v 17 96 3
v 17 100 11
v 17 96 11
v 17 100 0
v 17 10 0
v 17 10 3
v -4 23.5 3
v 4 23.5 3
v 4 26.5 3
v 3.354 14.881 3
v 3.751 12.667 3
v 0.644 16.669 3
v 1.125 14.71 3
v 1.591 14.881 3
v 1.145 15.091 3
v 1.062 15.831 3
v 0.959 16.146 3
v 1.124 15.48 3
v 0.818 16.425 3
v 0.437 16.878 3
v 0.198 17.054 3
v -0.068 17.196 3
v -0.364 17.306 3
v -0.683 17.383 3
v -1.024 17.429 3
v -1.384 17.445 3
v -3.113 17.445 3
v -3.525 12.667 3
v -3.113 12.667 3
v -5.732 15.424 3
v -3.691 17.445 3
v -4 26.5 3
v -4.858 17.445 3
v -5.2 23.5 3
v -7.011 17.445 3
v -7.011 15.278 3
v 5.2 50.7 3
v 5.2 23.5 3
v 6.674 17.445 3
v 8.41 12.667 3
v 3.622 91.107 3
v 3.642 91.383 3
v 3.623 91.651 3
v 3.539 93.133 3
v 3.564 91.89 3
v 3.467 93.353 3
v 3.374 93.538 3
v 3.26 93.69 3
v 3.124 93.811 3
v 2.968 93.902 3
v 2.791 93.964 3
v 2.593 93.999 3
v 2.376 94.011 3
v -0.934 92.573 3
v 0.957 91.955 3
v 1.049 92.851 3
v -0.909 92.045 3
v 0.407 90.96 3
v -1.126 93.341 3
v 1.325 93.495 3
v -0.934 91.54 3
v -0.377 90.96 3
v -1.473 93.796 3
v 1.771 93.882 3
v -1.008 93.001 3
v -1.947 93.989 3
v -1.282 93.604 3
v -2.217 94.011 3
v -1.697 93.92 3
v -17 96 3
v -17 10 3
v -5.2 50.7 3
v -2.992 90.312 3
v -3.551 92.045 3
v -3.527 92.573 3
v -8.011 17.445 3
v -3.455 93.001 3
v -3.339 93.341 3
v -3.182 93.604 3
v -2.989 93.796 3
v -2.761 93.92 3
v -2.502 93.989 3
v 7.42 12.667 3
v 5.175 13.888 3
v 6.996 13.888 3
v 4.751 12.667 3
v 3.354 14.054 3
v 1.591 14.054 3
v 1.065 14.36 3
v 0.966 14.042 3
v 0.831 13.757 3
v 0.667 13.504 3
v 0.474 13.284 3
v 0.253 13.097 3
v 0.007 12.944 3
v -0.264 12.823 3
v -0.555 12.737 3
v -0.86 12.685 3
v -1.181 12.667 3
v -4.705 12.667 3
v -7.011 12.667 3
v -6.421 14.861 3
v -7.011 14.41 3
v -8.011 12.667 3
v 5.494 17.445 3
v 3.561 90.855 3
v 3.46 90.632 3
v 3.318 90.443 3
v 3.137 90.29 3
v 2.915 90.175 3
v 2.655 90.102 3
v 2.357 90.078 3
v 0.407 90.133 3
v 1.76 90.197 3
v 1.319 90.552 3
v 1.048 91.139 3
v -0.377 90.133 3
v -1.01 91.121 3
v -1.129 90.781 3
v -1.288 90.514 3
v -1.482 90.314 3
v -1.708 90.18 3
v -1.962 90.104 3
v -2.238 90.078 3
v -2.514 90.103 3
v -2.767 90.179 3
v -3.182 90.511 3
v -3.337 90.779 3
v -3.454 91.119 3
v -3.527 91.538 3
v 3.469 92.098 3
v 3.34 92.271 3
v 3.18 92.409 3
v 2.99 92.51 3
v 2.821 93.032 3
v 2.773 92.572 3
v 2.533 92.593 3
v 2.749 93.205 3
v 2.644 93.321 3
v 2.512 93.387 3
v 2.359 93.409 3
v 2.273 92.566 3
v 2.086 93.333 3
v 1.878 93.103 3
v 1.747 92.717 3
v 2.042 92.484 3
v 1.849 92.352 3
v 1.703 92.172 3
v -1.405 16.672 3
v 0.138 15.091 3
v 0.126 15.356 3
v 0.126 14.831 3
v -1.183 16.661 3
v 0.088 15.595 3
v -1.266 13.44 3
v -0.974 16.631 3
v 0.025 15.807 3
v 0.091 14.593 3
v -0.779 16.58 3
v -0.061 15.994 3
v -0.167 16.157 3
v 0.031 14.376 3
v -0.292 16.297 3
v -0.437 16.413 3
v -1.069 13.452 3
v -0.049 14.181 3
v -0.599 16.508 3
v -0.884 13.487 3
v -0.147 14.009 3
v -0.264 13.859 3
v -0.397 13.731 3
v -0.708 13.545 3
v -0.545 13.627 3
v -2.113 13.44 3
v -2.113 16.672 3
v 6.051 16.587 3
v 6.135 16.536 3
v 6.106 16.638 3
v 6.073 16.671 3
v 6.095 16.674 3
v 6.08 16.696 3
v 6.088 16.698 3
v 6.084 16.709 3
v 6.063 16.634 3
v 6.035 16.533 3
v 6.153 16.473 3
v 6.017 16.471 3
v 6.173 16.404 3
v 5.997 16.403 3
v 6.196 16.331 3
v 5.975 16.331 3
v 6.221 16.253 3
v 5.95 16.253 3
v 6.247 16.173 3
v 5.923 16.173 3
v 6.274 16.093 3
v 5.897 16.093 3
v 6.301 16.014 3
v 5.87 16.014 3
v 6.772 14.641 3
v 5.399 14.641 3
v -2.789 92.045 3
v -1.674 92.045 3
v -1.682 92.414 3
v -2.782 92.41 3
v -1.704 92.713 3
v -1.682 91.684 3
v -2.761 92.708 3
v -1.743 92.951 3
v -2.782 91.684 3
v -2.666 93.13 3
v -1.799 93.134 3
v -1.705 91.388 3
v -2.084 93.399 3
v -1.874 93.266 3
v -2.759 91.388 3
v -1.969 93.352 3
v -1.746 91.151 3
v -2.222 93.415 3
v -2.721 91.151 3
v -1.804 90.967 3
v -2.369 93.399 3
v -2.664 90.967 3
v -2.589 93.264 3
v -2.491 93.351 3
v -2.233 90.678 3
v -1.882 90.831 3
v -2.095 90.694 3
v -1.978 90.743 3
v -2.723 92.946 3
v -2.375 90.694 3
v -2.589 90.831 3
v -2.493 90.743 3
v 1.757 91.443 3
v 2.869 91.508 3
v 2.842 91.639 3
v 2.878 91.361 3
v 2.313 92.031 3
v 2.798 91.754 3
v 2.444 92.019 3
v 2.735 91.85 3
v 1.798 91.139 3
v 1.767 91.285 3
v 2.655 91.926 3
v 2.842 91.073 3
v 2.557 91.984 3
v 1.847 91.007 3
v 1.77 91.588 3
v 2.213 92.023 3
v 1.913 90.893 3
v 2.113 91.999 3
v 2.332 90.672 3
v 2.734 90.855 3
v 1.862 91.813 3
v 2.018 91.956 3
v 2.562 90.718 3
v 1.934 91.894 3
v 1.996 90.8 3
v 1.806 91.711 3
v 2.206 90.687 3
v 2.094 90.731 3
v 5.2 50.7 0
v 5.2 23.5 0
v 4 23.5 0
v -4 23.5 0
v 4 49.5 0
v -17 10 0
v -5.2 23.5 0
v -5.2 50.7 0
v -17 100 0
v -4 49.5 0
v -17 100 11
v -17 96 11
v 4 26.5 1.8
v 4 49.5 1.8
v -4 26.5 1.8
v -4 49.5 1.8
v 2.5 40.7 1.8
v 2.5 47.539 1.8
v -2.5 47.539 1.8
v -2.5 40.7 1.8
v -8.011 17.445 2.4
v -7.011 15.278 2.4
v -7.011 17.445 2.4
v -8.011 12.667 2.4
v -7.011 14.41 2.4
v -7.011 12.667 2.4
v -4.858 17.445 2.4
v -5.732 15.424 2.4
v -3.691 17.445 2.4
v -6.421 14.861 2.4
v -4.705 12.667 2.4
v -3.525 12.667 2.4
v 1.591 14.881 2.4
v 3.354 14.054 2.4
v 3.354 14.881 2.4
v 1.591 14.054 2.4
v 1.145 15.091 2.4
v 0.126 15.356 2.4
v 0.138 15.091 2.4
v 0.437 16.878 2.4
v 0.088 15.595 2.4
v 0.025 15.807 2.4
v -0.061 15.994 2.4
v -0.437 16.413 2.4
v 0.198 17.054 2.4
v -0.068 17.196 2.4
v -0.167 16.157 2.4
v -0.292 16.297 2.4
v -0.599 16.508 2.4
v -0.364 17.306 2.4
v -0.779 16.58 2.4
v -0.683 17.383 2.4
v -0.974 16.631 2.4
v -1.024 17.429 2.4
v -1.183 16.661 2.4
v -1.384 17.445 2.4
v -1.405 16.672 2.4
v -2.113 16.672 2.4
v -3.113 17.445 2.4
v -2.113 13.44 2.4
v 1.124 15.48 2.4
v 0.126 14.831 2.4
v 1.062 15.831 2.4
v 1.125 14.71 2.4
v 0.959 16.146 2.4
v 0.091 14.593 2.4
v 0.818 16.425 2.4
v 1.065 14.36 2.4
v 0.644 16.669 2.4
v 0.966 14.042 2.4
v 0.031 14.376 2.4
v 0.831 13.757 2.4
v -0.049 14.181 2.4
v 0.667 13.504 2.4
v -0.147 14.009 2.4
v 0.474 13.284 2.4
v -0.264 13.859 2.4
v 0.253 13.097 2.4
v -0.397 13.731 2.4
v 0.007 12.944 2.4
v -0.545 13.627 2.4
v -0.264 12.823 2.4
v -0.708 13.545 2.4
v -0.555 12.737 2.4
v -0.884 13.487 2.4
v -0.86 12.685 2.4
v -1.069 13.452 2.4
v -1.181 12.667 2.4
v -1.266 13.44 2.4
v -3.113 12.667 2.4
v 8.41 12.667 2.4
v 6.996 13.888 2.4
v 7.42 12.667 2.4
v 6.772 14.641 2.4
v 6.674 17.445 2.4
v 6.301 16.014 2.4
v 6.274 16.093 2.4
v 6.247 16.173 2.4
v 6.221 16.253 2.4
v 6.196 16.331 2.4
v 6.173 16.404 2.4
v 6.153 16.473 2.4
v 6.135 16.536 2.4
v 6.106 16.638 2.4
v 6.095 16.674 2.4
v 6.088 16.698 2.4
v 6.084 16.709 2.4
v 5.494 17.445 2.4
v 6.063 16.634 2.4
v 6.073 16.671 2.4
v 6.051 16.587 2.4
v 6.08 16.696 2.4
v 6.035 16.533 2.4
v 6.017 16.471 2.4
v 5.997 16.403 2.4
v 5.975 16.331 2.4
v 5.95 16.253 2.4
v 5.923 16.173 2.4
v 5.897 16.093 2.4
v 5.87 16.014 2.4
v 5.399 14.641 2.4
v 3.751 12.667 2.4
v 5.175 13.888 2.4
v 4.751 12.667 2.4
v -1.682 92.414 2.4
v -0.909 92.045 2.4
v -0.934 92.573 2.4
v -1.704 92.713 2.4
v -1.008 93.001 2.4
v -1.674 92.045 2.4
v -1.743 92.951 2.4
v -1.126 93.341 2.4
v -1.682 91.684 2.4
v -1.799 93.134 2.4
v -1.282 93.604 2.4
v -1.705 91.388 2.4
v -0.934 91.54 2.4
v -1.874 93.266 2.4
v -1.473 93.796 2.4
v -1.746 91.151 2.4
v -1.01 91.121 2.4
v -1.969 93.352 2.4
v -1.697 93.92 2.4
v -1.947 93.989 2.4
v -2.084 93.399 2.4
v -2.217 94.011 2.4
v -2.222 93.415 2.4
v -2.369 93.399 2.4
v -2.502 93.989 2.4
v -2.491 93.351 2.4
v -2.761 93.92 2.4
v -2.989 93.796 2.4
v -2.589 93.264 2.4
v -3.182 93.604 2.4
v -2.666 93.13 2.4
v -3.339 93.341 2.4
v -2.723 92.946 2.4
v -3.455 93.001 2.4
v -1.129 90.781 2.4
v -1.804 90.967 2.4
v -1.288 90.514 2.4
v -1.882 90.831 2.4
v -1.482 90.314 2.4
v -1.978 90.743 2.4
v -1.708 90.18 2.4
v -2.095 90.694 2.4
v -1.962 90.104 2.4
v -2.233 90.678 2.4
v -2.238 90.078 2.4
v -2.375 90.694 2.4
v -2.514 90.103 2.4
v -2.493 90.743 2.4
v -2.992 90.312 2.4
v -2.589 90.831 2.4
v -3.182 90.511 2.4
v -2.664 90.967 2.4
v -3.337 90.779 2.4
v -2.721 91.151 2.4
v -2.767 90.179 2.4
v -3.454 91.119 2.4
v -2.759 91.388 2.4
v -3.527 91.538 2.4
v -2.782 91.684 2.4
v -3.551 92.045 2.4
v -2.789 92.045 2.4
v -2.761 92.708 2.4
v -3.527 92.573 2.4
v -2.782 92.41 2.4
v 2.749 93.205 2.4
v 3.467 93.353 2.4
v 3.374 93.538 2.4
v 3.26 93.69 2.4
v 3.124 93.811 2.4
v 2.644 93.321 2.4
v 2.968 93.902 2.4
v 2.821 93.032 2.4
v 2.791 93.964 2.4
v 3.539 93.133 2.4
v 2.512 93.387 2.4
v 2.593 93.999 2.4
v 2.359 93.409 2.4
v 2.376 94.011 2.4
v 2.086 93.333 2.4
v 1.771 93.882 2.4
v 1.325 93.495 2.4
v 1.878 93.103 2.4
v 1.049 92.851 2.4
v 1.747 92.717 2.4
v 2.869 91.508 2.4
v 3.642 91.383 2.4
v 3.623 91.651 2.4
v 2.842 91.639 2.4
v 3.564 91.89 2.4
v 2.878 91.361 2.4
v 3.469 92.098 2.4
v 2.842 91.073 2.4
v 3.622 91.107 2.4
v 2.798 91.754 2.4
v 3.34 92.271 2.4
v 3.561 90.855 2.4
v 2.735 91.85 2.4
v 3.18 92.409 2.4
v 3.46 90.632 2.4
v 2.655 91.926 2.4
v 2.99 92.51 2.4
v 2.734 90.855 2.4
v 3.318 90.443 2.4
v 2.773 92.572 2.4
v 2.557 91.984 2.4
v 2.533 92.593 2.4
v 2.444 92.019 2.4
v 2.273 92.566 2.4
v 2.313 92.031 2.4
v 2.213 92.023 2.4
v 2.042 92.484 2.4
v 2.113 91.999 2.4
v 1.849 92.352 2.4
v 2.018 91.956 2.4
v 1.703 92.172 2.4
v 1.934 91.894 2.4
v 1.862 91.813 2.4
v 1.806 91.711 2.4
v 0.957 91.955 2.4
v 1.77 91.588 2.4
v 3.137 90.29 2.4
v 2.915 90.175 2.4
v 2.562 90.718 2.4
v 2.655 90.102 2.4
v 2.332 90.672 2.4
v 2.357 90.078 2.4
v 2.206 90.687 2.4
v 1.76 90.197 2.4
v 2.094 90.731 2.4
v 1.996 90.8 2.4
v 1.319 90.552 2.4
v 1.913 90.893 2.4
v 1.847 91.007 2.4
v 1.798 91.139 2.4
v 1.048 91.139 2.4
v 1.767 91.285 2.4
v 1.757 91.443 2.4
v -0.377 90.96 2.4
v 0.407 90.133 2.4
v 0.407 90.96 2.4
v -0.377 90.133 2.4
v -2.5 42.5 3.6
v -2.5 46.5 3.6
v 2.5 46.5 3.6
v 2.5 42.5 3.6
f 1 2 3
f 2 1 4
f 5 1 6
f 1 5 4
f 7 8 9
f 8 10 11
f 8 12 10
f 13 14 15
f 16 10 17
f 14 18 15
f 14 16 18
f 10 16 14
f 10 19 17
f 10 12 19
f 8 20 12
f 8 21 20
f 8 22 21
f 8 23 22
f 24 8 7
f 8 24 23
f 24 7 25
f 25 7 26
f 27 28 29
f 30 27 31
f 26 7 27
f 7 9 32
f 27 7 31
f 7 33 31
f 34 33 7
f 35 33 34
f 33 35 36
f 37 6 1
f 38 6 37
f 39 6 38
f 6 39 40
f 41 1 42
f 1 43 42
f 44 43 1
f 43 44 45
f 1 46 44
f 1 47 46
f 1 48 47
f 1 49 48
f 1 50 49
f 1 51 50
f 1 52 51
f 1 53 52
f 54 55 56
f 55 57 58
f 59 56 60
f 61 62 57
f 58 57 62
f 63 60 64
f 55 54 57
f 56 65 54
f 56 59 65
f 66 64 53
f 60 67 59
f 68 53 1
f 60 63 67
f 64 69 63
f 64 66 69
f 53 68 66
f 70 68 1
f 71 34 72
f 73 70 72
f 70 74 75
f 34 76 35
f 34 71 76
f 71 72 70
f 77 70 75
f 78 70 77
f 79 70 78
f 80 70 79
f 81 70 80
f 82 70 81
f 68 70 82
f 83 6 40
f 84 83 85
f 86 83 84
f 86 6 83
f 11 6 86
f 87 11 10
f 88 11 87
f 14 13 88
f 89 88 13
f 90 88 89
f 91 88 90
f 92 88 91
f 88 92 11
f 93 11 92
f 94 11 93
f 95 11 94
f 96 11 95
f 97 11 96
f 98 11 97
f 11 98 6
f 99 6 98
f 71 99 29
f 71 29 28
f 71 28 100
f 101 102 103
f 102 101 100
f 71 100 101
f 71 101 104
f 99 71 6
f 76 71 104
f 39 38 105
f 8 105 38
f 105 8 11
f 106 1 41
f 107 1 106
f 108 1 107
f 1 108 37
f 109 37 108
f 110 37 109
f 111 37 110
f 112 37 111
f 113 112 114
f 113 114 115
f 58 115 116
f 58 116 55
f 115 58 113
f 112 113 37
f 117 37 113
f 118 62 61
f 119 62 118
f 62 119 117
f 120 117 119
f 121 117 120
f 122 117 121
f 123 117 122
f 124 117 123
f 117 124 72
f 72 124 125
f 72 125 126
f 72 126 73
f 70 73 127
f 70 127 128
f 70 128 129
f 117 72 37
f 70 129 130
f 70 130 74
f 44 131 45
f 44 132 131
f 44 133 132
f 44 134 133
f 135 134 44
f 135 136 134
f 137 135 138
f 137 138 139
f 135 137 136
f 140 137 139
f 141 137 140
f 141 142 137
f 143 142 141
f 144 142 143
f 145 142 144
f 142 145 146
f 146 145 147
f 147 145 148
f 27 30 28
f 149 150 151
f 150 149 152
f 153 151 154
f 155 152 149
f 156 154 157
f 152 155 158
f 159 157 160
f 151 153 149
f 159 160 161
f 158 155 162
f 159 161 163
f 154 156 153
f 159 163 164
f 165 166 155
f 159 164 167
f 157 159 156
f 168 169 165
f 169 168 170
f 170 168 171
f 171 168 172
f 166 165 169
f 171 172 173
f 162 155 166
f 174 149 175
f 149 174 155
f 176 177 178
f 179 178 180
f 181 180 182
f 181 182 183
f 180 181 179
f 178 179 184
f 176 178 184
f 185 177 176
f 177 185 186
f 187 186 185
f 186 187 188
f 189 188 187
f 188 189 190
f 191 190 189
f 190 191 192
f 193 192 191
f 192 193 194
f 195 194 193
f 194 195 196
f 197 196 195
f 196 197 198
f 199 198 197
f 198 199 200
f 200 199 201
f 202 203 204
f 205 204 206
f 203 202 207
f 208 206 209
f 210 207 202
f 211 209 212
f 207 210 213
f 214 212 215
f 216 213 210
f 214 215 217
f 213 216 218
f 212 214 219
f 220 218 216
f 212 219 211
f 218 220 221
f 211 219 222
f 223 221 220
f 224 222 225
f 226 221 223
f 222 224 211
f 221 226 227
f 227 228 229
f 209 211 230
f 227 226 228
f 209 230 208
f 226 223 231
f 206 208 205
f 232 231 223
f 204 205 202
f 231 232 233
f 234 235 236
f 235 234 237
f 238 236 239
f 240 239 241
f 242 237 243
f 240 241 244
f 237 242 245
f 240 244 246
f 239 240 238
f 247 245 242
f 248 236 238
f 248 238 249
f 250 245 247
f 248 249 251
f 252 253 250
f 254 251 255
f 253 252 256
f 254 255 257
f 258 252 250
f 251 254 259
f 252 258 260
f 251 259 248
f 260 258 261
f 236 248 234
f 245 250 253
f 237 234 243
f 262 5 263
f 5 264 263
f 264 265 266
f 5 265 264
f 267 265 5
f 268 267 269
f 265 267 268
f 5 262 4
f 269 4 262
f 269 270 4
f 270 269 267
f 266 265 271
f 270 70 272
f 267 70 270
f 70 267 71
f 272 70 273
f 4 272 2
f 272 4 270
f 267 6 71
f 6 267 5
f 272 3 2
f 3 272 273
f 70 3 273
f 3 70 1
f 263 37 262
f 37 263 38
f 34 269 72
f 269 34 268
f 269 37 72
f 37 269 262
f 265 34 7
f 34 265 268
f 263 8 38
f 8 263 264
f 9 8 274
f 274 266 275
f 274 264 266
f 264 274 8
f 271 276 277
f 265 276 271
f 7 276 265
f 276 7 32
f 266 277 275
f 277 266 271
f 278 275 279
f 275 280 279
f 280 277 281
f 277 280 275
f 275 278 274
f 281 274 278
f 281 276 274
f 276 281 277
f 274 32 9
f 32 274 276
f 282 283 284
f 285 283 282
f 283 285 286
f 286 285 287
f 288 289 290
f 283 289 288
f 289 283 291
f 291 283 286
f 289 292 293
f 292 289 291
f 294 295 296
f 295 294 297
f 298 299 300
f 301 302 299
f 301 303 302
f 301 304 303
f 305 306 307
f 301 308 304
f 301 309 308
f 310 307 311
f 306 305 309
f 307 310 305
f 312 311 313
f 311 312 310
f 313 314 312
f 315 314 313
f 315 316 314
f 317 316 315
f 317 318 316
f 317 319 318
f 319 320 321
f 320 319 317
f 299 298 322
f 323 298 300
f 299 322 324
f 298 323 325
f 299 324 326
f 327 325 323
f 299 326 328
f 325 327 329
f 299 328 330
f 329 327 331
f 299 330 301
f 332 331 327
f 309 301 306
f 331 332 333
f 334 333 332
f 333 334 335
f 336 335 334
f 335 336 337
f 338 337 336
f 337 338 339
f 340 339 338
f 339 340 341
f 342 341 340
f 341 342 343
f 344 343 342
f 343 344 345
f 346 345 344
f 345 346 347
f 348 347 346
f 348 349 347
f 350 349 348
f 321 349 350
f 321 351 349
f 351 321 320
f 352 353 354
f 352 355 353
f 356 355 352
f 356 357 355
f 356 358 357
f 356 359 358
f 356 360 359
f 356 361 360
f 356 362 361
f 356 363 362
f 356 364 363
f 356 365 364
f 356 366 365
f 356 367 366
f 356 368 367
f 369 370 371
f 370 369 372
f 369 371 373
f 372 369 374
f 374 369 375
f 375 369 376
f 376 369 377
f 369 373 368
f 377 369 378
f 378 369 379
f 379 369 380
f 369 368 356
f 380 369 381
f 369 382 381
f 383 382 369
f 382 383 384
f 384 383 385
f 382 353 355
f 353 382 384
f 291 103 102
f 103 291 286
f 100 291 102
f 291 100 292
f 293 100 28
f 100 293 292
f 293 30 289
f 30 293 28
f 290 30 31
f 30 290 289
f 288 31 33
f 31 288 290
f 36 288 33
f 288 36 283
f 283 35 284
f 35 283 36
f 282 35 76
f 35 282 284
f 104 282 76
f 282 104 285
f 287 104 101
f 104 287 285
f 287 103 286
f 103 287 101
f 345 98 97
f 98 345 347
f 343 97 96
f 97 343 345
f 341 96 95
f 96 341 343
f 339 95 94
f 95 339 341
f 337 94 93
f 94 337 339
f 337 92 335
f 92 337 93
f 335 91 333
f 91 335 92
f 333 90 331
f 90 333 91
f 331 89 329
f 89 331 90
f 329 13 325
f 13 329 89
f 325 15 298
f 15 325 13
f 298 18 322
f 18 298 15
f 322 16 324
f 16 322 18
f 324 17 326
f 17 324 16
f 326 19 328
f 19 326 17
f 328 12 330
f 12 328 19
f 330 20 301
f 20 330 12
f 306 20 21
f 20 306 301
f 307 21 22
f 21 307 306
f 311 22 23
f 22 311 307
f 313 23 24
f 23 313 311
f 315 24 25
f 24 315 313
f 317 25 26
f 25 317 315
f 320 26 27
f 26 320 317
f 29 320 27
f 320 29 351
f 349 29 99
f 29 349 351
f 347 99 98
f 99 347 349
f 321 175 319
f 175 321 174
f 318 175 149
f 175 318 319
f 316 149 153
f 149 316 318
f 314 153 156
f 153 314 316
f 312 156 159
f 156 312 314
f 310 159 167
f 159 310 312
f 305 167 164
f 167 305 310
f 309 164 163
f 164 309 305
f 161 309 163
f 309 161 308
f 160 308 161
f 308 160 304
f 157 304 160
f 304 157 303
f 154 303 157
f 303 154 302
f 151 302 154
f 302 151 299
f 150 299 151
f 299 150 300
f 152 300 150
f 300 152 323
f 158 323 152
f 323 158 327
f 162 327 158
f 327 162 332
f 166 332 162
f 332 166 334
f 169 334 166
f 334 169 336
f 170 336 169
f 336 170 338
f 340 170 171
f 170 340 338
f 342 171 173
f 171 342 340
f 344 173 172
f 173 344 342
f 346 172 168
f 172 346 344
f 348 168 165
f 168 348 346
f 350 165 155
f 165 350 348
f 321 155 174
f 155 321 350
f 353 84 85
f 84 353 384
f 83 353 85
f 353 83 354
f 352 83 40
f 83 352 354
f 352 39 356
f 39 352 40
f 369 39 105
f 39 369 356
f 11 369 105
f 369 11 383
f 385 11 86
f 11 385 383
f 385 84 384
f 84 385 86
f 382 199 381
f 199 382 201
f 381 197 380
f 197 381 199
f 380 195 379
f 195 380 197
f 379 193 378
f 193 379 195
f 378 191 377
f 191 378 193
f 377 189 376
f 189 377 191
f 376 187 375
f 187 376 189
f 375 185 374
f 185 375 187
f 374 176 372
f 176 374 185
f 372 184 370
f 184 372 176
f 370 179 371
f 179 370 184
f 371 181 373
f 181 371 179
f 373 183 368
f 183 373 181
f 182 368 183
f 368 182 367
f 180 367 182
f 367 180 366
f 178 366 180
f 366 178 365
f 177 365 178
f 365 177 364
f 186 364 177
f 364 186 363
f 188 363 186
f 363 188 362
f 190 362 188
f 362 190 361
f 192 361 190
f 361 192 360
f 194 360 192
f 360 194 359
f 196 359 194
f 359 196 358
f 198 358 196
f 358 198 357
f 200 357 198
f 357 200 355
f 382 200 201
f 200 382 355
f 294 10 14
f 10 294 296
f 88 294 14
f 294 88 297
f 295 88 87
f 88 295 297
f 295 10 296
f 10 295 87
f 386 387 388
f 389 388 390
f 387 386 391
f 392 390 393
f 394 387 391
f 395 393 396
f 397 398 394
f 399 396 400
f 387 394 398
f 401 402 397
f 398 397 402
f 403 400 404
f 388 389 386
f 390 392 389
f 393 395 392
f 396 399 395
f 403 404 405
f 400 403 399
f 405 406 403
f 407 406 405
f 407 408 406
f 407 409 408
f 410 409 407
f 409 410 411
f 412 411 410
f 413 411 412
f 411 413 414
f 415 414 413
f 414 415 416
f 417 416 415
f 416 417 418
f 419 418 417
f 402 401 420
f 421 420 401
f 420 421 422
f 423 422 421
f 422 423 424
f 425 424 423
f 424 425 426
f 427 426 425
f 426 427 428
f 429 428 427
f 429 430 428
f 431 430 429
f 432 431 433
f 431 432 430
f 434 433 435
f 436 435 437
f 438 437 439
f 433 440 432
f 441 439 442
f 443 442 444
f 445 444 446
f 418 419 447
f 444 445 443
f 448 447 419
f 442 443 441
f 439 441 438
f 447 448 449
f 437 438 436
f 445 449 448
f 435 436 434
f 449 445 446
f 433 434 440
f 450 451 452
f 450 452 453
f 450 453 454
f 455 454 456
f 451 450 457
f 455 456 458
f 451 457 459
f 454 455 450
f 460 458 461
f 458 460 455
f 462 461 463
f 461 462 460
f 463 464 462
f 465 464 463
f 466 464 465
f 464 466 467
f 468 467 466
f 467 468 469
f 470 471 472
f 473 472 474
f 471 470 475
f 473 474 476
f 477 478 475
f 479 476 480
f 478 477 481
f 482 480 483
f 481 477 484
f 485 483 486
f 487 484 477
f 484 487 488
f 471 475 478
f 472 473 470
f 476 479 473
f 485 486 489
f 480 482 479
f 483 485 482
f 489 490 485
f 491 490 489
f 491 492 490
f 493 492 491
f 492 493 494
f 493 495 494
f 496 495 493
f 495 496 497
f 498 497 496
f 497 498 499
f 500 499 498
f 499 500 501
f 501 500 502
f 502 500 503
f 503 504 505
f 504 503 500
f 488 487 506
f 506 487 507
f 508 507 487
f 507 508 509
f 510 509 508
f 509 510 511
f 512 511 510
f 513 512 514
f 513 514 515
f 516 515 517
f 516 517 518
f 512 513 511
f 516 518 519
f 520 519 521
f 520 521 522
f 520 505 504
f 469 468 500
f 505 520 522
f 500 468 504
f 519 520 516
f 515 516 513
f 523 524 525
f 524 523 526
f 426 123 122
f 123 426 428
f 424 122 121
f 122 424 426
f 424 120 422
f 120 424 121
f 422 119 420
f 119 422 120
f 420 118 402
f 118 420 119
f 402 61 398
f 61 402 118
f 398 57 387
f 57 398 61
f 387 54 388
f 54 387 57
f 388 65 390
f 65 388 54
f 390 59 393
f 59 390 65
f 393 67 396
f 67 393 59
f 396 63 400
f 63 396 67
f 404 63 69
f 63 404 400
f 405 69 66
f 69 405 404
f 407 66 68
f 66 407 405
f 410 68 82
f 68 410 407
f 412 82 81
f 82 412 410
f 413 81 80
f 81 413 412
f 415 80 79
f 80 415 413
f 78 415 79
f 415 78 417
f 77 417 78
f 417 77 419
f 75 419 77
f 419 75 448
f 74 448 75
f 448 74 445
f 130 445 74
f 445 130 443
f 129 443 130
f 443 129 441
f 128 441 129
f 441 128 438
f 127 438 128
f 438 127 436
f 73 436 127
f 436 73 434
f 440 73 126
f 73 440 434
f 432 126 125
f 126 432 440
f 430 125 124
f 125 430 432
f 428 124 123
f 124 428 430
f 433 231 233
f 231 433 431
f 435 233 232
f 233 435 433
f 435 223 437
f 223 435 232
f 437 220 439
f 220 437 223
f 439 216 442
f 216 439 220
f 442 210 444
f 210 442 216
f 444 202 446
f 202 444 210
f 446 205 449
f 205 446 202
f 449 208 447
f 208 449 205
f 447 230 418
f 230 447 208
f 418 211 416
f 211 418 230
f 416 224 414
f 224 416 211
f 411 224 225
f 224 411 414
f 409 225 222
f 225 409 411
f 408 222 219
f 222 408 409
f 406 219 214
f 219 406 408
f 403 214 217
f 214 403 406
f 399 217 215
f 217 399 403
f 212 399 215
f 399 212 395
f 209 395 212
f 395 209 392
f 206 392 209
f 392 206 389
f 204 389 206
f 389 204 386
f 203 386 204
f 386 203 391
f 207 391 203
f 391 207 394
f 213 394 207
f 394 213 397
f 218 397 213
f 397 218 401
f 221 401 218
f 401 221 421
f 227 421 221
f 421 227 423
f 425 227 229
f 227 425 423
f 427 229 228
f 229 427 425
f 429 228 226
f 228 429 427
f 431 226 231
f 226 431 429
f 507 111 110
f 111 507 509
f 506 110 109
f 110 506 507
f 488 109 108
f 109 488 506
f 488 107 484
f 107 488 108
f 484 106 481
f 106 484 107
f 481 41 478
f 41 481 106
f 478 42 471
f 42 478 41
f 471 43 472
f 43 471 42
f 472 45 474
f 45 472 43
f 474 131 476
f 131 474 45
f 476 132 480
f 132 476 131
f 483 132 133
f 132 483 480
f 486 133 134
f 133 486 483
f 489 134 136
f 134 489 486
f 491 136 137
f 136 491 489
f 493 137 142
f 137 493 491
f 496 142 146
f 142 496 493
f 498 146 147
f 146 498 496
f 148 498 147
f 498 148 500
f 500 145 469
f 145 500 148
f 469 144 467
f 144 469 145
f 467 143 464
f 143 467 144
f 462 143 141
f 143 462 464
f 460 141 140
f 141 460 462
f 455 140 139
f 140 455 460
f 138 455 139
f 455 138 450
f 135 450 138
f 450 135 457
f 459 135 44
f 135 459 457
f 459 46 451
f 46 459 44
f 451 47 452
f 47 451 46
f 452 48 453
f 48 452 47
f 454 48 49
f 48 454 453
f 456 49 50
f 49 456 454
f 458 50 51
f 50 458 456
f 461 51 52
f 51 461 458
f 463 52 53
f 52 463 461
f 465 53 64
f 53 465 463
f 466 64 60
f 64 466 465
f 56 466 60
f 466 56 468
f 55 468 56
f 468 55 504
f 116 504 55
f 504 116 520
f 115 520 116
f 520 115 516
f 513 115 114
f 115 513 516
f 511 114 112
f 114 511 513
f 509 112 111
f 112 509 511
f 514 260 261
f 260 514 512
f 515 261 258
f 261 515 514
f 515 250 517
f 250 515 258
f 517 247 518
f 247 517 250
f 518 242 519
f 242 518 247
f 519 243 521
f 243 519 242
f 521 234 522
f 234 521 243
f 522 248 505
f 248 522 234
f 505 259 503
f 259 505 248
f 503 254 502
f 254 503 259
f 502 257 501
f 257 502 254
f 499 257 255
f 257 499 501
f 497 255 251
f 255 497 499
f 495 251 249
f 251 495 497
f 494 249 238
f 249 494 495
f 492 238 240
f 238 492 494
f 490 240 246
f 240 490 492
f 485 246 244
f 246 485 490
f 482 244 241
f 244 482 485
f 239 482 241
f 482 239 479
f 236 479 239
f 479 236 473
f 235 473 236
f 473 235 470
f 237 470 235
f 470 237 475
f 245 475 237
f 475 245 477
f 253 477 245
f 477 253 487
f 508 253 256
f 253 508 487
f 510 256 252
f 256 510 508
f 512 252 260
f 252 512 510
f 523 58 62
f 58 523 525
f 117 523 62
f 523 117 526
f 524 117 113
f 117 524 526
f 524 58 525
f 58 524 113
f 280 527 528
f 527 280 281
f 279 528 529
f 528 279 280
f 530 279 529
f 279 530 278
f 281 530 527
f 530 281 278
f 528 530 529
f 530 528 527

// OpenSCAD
// KD keyhole-detent coupons (Brian, 2026-10-23). One detent of the TL-SG108E tray (build.py in
// outputs/STL_Deliveries/2026-10-23_TL-SG108E_flush) on a small floor piece, with the rear stop at the real distance.
// Test: set the switch (ports away from the wall) on the coupon, keyhole side down, slide it back until it touches the
// wall; the bump should drop into one keyhole's round part. Fit/retention/strength UNKNOWN; specimen-specific.
id="KD-A"; bump_up=0.6;            // KD-A 0.6, KD-B 0.8, KD-C 1.0 mm above the floor
tray_t=3; arm_w=8; arm_t=1.8; arm_l=26; arm_gap=1.2; bump_w=5; bump_flat=4;
key_y=44.5;                        // keyhole centre (48.5 behind the port face, which sits at Y=-4)
stop_y=96; stop_t=4; stop_h=8;     // rear stop face at 96 (switch depth 100)
w=34; y0=10;                       // coupon width / front edge
arm_end=key_y+5; arm_root=arm_end-arm_l;
arm_z0=tray_t-1.2-arm_t;          // arm hangs 1.2 below the floor top; pocket under it (0 for a 3 mm floor)
bump_base=arm_z0+arm_t; bump_top=tray_t+bump_up; bump_hh=bump_top-bump_base;
difference(){
 union(){
  translate([-w/2,y0,0])cube([w,stop_y+stop_t-y0,tray_t]);
  translate([-w/2,stop_y,0])cube([w,stop_t,tray_t+stop_h]);
 }
 difference(){translate([-arm_w/2-arm_gap,arm_root,-0.1])cube([arm_w+2*arm_gap,arm_l+arm_gap,tray_t+0.2]);
  translate([-arm_w/2,arm_root-0.1,-0.2])cube([arm_w,arm_l+0.1,tray_t+0.4]);}
 translate([-arm_w/2-0.01,arm_root+3,bump_base])cube([arm_w+0.02,arm_l-3+0.01,tray_t]);
 if(arm_z0>0)translate([-arm_w/2-0.01,arm_root+3,-0.1])cube([arm_w+0.02,arm_l-3+0.01,arm_z0+0.1]);
 // ID engraved 0.6 mm into the floor top, in front of the arm
 translate([0,y0+5,tray_t-0.6])linear_extrude(1)text(id,size=5,font="Liberation Sans:style=Bold",halign="center",valign="center");
 translate([0,stop_y-4,tray_t-0.6])linear_extrude(1)text(str(bump_up),size=4,font="Liberation Sans:style=Bold",halign="center",valign="center");
}
translate([-bump_w/2,0,0])rotate([90,0,90])linear_extrude(height=bump_w)
 polygon([[key_y-bump_flat/2-bump_hh,bump_base],[key_y-bump_flat/2,bump_top],[key_y+bump_flat/2,bump_top],[key_y+bump_flat/2+bump_hh*tan(30),bump_base]]);
